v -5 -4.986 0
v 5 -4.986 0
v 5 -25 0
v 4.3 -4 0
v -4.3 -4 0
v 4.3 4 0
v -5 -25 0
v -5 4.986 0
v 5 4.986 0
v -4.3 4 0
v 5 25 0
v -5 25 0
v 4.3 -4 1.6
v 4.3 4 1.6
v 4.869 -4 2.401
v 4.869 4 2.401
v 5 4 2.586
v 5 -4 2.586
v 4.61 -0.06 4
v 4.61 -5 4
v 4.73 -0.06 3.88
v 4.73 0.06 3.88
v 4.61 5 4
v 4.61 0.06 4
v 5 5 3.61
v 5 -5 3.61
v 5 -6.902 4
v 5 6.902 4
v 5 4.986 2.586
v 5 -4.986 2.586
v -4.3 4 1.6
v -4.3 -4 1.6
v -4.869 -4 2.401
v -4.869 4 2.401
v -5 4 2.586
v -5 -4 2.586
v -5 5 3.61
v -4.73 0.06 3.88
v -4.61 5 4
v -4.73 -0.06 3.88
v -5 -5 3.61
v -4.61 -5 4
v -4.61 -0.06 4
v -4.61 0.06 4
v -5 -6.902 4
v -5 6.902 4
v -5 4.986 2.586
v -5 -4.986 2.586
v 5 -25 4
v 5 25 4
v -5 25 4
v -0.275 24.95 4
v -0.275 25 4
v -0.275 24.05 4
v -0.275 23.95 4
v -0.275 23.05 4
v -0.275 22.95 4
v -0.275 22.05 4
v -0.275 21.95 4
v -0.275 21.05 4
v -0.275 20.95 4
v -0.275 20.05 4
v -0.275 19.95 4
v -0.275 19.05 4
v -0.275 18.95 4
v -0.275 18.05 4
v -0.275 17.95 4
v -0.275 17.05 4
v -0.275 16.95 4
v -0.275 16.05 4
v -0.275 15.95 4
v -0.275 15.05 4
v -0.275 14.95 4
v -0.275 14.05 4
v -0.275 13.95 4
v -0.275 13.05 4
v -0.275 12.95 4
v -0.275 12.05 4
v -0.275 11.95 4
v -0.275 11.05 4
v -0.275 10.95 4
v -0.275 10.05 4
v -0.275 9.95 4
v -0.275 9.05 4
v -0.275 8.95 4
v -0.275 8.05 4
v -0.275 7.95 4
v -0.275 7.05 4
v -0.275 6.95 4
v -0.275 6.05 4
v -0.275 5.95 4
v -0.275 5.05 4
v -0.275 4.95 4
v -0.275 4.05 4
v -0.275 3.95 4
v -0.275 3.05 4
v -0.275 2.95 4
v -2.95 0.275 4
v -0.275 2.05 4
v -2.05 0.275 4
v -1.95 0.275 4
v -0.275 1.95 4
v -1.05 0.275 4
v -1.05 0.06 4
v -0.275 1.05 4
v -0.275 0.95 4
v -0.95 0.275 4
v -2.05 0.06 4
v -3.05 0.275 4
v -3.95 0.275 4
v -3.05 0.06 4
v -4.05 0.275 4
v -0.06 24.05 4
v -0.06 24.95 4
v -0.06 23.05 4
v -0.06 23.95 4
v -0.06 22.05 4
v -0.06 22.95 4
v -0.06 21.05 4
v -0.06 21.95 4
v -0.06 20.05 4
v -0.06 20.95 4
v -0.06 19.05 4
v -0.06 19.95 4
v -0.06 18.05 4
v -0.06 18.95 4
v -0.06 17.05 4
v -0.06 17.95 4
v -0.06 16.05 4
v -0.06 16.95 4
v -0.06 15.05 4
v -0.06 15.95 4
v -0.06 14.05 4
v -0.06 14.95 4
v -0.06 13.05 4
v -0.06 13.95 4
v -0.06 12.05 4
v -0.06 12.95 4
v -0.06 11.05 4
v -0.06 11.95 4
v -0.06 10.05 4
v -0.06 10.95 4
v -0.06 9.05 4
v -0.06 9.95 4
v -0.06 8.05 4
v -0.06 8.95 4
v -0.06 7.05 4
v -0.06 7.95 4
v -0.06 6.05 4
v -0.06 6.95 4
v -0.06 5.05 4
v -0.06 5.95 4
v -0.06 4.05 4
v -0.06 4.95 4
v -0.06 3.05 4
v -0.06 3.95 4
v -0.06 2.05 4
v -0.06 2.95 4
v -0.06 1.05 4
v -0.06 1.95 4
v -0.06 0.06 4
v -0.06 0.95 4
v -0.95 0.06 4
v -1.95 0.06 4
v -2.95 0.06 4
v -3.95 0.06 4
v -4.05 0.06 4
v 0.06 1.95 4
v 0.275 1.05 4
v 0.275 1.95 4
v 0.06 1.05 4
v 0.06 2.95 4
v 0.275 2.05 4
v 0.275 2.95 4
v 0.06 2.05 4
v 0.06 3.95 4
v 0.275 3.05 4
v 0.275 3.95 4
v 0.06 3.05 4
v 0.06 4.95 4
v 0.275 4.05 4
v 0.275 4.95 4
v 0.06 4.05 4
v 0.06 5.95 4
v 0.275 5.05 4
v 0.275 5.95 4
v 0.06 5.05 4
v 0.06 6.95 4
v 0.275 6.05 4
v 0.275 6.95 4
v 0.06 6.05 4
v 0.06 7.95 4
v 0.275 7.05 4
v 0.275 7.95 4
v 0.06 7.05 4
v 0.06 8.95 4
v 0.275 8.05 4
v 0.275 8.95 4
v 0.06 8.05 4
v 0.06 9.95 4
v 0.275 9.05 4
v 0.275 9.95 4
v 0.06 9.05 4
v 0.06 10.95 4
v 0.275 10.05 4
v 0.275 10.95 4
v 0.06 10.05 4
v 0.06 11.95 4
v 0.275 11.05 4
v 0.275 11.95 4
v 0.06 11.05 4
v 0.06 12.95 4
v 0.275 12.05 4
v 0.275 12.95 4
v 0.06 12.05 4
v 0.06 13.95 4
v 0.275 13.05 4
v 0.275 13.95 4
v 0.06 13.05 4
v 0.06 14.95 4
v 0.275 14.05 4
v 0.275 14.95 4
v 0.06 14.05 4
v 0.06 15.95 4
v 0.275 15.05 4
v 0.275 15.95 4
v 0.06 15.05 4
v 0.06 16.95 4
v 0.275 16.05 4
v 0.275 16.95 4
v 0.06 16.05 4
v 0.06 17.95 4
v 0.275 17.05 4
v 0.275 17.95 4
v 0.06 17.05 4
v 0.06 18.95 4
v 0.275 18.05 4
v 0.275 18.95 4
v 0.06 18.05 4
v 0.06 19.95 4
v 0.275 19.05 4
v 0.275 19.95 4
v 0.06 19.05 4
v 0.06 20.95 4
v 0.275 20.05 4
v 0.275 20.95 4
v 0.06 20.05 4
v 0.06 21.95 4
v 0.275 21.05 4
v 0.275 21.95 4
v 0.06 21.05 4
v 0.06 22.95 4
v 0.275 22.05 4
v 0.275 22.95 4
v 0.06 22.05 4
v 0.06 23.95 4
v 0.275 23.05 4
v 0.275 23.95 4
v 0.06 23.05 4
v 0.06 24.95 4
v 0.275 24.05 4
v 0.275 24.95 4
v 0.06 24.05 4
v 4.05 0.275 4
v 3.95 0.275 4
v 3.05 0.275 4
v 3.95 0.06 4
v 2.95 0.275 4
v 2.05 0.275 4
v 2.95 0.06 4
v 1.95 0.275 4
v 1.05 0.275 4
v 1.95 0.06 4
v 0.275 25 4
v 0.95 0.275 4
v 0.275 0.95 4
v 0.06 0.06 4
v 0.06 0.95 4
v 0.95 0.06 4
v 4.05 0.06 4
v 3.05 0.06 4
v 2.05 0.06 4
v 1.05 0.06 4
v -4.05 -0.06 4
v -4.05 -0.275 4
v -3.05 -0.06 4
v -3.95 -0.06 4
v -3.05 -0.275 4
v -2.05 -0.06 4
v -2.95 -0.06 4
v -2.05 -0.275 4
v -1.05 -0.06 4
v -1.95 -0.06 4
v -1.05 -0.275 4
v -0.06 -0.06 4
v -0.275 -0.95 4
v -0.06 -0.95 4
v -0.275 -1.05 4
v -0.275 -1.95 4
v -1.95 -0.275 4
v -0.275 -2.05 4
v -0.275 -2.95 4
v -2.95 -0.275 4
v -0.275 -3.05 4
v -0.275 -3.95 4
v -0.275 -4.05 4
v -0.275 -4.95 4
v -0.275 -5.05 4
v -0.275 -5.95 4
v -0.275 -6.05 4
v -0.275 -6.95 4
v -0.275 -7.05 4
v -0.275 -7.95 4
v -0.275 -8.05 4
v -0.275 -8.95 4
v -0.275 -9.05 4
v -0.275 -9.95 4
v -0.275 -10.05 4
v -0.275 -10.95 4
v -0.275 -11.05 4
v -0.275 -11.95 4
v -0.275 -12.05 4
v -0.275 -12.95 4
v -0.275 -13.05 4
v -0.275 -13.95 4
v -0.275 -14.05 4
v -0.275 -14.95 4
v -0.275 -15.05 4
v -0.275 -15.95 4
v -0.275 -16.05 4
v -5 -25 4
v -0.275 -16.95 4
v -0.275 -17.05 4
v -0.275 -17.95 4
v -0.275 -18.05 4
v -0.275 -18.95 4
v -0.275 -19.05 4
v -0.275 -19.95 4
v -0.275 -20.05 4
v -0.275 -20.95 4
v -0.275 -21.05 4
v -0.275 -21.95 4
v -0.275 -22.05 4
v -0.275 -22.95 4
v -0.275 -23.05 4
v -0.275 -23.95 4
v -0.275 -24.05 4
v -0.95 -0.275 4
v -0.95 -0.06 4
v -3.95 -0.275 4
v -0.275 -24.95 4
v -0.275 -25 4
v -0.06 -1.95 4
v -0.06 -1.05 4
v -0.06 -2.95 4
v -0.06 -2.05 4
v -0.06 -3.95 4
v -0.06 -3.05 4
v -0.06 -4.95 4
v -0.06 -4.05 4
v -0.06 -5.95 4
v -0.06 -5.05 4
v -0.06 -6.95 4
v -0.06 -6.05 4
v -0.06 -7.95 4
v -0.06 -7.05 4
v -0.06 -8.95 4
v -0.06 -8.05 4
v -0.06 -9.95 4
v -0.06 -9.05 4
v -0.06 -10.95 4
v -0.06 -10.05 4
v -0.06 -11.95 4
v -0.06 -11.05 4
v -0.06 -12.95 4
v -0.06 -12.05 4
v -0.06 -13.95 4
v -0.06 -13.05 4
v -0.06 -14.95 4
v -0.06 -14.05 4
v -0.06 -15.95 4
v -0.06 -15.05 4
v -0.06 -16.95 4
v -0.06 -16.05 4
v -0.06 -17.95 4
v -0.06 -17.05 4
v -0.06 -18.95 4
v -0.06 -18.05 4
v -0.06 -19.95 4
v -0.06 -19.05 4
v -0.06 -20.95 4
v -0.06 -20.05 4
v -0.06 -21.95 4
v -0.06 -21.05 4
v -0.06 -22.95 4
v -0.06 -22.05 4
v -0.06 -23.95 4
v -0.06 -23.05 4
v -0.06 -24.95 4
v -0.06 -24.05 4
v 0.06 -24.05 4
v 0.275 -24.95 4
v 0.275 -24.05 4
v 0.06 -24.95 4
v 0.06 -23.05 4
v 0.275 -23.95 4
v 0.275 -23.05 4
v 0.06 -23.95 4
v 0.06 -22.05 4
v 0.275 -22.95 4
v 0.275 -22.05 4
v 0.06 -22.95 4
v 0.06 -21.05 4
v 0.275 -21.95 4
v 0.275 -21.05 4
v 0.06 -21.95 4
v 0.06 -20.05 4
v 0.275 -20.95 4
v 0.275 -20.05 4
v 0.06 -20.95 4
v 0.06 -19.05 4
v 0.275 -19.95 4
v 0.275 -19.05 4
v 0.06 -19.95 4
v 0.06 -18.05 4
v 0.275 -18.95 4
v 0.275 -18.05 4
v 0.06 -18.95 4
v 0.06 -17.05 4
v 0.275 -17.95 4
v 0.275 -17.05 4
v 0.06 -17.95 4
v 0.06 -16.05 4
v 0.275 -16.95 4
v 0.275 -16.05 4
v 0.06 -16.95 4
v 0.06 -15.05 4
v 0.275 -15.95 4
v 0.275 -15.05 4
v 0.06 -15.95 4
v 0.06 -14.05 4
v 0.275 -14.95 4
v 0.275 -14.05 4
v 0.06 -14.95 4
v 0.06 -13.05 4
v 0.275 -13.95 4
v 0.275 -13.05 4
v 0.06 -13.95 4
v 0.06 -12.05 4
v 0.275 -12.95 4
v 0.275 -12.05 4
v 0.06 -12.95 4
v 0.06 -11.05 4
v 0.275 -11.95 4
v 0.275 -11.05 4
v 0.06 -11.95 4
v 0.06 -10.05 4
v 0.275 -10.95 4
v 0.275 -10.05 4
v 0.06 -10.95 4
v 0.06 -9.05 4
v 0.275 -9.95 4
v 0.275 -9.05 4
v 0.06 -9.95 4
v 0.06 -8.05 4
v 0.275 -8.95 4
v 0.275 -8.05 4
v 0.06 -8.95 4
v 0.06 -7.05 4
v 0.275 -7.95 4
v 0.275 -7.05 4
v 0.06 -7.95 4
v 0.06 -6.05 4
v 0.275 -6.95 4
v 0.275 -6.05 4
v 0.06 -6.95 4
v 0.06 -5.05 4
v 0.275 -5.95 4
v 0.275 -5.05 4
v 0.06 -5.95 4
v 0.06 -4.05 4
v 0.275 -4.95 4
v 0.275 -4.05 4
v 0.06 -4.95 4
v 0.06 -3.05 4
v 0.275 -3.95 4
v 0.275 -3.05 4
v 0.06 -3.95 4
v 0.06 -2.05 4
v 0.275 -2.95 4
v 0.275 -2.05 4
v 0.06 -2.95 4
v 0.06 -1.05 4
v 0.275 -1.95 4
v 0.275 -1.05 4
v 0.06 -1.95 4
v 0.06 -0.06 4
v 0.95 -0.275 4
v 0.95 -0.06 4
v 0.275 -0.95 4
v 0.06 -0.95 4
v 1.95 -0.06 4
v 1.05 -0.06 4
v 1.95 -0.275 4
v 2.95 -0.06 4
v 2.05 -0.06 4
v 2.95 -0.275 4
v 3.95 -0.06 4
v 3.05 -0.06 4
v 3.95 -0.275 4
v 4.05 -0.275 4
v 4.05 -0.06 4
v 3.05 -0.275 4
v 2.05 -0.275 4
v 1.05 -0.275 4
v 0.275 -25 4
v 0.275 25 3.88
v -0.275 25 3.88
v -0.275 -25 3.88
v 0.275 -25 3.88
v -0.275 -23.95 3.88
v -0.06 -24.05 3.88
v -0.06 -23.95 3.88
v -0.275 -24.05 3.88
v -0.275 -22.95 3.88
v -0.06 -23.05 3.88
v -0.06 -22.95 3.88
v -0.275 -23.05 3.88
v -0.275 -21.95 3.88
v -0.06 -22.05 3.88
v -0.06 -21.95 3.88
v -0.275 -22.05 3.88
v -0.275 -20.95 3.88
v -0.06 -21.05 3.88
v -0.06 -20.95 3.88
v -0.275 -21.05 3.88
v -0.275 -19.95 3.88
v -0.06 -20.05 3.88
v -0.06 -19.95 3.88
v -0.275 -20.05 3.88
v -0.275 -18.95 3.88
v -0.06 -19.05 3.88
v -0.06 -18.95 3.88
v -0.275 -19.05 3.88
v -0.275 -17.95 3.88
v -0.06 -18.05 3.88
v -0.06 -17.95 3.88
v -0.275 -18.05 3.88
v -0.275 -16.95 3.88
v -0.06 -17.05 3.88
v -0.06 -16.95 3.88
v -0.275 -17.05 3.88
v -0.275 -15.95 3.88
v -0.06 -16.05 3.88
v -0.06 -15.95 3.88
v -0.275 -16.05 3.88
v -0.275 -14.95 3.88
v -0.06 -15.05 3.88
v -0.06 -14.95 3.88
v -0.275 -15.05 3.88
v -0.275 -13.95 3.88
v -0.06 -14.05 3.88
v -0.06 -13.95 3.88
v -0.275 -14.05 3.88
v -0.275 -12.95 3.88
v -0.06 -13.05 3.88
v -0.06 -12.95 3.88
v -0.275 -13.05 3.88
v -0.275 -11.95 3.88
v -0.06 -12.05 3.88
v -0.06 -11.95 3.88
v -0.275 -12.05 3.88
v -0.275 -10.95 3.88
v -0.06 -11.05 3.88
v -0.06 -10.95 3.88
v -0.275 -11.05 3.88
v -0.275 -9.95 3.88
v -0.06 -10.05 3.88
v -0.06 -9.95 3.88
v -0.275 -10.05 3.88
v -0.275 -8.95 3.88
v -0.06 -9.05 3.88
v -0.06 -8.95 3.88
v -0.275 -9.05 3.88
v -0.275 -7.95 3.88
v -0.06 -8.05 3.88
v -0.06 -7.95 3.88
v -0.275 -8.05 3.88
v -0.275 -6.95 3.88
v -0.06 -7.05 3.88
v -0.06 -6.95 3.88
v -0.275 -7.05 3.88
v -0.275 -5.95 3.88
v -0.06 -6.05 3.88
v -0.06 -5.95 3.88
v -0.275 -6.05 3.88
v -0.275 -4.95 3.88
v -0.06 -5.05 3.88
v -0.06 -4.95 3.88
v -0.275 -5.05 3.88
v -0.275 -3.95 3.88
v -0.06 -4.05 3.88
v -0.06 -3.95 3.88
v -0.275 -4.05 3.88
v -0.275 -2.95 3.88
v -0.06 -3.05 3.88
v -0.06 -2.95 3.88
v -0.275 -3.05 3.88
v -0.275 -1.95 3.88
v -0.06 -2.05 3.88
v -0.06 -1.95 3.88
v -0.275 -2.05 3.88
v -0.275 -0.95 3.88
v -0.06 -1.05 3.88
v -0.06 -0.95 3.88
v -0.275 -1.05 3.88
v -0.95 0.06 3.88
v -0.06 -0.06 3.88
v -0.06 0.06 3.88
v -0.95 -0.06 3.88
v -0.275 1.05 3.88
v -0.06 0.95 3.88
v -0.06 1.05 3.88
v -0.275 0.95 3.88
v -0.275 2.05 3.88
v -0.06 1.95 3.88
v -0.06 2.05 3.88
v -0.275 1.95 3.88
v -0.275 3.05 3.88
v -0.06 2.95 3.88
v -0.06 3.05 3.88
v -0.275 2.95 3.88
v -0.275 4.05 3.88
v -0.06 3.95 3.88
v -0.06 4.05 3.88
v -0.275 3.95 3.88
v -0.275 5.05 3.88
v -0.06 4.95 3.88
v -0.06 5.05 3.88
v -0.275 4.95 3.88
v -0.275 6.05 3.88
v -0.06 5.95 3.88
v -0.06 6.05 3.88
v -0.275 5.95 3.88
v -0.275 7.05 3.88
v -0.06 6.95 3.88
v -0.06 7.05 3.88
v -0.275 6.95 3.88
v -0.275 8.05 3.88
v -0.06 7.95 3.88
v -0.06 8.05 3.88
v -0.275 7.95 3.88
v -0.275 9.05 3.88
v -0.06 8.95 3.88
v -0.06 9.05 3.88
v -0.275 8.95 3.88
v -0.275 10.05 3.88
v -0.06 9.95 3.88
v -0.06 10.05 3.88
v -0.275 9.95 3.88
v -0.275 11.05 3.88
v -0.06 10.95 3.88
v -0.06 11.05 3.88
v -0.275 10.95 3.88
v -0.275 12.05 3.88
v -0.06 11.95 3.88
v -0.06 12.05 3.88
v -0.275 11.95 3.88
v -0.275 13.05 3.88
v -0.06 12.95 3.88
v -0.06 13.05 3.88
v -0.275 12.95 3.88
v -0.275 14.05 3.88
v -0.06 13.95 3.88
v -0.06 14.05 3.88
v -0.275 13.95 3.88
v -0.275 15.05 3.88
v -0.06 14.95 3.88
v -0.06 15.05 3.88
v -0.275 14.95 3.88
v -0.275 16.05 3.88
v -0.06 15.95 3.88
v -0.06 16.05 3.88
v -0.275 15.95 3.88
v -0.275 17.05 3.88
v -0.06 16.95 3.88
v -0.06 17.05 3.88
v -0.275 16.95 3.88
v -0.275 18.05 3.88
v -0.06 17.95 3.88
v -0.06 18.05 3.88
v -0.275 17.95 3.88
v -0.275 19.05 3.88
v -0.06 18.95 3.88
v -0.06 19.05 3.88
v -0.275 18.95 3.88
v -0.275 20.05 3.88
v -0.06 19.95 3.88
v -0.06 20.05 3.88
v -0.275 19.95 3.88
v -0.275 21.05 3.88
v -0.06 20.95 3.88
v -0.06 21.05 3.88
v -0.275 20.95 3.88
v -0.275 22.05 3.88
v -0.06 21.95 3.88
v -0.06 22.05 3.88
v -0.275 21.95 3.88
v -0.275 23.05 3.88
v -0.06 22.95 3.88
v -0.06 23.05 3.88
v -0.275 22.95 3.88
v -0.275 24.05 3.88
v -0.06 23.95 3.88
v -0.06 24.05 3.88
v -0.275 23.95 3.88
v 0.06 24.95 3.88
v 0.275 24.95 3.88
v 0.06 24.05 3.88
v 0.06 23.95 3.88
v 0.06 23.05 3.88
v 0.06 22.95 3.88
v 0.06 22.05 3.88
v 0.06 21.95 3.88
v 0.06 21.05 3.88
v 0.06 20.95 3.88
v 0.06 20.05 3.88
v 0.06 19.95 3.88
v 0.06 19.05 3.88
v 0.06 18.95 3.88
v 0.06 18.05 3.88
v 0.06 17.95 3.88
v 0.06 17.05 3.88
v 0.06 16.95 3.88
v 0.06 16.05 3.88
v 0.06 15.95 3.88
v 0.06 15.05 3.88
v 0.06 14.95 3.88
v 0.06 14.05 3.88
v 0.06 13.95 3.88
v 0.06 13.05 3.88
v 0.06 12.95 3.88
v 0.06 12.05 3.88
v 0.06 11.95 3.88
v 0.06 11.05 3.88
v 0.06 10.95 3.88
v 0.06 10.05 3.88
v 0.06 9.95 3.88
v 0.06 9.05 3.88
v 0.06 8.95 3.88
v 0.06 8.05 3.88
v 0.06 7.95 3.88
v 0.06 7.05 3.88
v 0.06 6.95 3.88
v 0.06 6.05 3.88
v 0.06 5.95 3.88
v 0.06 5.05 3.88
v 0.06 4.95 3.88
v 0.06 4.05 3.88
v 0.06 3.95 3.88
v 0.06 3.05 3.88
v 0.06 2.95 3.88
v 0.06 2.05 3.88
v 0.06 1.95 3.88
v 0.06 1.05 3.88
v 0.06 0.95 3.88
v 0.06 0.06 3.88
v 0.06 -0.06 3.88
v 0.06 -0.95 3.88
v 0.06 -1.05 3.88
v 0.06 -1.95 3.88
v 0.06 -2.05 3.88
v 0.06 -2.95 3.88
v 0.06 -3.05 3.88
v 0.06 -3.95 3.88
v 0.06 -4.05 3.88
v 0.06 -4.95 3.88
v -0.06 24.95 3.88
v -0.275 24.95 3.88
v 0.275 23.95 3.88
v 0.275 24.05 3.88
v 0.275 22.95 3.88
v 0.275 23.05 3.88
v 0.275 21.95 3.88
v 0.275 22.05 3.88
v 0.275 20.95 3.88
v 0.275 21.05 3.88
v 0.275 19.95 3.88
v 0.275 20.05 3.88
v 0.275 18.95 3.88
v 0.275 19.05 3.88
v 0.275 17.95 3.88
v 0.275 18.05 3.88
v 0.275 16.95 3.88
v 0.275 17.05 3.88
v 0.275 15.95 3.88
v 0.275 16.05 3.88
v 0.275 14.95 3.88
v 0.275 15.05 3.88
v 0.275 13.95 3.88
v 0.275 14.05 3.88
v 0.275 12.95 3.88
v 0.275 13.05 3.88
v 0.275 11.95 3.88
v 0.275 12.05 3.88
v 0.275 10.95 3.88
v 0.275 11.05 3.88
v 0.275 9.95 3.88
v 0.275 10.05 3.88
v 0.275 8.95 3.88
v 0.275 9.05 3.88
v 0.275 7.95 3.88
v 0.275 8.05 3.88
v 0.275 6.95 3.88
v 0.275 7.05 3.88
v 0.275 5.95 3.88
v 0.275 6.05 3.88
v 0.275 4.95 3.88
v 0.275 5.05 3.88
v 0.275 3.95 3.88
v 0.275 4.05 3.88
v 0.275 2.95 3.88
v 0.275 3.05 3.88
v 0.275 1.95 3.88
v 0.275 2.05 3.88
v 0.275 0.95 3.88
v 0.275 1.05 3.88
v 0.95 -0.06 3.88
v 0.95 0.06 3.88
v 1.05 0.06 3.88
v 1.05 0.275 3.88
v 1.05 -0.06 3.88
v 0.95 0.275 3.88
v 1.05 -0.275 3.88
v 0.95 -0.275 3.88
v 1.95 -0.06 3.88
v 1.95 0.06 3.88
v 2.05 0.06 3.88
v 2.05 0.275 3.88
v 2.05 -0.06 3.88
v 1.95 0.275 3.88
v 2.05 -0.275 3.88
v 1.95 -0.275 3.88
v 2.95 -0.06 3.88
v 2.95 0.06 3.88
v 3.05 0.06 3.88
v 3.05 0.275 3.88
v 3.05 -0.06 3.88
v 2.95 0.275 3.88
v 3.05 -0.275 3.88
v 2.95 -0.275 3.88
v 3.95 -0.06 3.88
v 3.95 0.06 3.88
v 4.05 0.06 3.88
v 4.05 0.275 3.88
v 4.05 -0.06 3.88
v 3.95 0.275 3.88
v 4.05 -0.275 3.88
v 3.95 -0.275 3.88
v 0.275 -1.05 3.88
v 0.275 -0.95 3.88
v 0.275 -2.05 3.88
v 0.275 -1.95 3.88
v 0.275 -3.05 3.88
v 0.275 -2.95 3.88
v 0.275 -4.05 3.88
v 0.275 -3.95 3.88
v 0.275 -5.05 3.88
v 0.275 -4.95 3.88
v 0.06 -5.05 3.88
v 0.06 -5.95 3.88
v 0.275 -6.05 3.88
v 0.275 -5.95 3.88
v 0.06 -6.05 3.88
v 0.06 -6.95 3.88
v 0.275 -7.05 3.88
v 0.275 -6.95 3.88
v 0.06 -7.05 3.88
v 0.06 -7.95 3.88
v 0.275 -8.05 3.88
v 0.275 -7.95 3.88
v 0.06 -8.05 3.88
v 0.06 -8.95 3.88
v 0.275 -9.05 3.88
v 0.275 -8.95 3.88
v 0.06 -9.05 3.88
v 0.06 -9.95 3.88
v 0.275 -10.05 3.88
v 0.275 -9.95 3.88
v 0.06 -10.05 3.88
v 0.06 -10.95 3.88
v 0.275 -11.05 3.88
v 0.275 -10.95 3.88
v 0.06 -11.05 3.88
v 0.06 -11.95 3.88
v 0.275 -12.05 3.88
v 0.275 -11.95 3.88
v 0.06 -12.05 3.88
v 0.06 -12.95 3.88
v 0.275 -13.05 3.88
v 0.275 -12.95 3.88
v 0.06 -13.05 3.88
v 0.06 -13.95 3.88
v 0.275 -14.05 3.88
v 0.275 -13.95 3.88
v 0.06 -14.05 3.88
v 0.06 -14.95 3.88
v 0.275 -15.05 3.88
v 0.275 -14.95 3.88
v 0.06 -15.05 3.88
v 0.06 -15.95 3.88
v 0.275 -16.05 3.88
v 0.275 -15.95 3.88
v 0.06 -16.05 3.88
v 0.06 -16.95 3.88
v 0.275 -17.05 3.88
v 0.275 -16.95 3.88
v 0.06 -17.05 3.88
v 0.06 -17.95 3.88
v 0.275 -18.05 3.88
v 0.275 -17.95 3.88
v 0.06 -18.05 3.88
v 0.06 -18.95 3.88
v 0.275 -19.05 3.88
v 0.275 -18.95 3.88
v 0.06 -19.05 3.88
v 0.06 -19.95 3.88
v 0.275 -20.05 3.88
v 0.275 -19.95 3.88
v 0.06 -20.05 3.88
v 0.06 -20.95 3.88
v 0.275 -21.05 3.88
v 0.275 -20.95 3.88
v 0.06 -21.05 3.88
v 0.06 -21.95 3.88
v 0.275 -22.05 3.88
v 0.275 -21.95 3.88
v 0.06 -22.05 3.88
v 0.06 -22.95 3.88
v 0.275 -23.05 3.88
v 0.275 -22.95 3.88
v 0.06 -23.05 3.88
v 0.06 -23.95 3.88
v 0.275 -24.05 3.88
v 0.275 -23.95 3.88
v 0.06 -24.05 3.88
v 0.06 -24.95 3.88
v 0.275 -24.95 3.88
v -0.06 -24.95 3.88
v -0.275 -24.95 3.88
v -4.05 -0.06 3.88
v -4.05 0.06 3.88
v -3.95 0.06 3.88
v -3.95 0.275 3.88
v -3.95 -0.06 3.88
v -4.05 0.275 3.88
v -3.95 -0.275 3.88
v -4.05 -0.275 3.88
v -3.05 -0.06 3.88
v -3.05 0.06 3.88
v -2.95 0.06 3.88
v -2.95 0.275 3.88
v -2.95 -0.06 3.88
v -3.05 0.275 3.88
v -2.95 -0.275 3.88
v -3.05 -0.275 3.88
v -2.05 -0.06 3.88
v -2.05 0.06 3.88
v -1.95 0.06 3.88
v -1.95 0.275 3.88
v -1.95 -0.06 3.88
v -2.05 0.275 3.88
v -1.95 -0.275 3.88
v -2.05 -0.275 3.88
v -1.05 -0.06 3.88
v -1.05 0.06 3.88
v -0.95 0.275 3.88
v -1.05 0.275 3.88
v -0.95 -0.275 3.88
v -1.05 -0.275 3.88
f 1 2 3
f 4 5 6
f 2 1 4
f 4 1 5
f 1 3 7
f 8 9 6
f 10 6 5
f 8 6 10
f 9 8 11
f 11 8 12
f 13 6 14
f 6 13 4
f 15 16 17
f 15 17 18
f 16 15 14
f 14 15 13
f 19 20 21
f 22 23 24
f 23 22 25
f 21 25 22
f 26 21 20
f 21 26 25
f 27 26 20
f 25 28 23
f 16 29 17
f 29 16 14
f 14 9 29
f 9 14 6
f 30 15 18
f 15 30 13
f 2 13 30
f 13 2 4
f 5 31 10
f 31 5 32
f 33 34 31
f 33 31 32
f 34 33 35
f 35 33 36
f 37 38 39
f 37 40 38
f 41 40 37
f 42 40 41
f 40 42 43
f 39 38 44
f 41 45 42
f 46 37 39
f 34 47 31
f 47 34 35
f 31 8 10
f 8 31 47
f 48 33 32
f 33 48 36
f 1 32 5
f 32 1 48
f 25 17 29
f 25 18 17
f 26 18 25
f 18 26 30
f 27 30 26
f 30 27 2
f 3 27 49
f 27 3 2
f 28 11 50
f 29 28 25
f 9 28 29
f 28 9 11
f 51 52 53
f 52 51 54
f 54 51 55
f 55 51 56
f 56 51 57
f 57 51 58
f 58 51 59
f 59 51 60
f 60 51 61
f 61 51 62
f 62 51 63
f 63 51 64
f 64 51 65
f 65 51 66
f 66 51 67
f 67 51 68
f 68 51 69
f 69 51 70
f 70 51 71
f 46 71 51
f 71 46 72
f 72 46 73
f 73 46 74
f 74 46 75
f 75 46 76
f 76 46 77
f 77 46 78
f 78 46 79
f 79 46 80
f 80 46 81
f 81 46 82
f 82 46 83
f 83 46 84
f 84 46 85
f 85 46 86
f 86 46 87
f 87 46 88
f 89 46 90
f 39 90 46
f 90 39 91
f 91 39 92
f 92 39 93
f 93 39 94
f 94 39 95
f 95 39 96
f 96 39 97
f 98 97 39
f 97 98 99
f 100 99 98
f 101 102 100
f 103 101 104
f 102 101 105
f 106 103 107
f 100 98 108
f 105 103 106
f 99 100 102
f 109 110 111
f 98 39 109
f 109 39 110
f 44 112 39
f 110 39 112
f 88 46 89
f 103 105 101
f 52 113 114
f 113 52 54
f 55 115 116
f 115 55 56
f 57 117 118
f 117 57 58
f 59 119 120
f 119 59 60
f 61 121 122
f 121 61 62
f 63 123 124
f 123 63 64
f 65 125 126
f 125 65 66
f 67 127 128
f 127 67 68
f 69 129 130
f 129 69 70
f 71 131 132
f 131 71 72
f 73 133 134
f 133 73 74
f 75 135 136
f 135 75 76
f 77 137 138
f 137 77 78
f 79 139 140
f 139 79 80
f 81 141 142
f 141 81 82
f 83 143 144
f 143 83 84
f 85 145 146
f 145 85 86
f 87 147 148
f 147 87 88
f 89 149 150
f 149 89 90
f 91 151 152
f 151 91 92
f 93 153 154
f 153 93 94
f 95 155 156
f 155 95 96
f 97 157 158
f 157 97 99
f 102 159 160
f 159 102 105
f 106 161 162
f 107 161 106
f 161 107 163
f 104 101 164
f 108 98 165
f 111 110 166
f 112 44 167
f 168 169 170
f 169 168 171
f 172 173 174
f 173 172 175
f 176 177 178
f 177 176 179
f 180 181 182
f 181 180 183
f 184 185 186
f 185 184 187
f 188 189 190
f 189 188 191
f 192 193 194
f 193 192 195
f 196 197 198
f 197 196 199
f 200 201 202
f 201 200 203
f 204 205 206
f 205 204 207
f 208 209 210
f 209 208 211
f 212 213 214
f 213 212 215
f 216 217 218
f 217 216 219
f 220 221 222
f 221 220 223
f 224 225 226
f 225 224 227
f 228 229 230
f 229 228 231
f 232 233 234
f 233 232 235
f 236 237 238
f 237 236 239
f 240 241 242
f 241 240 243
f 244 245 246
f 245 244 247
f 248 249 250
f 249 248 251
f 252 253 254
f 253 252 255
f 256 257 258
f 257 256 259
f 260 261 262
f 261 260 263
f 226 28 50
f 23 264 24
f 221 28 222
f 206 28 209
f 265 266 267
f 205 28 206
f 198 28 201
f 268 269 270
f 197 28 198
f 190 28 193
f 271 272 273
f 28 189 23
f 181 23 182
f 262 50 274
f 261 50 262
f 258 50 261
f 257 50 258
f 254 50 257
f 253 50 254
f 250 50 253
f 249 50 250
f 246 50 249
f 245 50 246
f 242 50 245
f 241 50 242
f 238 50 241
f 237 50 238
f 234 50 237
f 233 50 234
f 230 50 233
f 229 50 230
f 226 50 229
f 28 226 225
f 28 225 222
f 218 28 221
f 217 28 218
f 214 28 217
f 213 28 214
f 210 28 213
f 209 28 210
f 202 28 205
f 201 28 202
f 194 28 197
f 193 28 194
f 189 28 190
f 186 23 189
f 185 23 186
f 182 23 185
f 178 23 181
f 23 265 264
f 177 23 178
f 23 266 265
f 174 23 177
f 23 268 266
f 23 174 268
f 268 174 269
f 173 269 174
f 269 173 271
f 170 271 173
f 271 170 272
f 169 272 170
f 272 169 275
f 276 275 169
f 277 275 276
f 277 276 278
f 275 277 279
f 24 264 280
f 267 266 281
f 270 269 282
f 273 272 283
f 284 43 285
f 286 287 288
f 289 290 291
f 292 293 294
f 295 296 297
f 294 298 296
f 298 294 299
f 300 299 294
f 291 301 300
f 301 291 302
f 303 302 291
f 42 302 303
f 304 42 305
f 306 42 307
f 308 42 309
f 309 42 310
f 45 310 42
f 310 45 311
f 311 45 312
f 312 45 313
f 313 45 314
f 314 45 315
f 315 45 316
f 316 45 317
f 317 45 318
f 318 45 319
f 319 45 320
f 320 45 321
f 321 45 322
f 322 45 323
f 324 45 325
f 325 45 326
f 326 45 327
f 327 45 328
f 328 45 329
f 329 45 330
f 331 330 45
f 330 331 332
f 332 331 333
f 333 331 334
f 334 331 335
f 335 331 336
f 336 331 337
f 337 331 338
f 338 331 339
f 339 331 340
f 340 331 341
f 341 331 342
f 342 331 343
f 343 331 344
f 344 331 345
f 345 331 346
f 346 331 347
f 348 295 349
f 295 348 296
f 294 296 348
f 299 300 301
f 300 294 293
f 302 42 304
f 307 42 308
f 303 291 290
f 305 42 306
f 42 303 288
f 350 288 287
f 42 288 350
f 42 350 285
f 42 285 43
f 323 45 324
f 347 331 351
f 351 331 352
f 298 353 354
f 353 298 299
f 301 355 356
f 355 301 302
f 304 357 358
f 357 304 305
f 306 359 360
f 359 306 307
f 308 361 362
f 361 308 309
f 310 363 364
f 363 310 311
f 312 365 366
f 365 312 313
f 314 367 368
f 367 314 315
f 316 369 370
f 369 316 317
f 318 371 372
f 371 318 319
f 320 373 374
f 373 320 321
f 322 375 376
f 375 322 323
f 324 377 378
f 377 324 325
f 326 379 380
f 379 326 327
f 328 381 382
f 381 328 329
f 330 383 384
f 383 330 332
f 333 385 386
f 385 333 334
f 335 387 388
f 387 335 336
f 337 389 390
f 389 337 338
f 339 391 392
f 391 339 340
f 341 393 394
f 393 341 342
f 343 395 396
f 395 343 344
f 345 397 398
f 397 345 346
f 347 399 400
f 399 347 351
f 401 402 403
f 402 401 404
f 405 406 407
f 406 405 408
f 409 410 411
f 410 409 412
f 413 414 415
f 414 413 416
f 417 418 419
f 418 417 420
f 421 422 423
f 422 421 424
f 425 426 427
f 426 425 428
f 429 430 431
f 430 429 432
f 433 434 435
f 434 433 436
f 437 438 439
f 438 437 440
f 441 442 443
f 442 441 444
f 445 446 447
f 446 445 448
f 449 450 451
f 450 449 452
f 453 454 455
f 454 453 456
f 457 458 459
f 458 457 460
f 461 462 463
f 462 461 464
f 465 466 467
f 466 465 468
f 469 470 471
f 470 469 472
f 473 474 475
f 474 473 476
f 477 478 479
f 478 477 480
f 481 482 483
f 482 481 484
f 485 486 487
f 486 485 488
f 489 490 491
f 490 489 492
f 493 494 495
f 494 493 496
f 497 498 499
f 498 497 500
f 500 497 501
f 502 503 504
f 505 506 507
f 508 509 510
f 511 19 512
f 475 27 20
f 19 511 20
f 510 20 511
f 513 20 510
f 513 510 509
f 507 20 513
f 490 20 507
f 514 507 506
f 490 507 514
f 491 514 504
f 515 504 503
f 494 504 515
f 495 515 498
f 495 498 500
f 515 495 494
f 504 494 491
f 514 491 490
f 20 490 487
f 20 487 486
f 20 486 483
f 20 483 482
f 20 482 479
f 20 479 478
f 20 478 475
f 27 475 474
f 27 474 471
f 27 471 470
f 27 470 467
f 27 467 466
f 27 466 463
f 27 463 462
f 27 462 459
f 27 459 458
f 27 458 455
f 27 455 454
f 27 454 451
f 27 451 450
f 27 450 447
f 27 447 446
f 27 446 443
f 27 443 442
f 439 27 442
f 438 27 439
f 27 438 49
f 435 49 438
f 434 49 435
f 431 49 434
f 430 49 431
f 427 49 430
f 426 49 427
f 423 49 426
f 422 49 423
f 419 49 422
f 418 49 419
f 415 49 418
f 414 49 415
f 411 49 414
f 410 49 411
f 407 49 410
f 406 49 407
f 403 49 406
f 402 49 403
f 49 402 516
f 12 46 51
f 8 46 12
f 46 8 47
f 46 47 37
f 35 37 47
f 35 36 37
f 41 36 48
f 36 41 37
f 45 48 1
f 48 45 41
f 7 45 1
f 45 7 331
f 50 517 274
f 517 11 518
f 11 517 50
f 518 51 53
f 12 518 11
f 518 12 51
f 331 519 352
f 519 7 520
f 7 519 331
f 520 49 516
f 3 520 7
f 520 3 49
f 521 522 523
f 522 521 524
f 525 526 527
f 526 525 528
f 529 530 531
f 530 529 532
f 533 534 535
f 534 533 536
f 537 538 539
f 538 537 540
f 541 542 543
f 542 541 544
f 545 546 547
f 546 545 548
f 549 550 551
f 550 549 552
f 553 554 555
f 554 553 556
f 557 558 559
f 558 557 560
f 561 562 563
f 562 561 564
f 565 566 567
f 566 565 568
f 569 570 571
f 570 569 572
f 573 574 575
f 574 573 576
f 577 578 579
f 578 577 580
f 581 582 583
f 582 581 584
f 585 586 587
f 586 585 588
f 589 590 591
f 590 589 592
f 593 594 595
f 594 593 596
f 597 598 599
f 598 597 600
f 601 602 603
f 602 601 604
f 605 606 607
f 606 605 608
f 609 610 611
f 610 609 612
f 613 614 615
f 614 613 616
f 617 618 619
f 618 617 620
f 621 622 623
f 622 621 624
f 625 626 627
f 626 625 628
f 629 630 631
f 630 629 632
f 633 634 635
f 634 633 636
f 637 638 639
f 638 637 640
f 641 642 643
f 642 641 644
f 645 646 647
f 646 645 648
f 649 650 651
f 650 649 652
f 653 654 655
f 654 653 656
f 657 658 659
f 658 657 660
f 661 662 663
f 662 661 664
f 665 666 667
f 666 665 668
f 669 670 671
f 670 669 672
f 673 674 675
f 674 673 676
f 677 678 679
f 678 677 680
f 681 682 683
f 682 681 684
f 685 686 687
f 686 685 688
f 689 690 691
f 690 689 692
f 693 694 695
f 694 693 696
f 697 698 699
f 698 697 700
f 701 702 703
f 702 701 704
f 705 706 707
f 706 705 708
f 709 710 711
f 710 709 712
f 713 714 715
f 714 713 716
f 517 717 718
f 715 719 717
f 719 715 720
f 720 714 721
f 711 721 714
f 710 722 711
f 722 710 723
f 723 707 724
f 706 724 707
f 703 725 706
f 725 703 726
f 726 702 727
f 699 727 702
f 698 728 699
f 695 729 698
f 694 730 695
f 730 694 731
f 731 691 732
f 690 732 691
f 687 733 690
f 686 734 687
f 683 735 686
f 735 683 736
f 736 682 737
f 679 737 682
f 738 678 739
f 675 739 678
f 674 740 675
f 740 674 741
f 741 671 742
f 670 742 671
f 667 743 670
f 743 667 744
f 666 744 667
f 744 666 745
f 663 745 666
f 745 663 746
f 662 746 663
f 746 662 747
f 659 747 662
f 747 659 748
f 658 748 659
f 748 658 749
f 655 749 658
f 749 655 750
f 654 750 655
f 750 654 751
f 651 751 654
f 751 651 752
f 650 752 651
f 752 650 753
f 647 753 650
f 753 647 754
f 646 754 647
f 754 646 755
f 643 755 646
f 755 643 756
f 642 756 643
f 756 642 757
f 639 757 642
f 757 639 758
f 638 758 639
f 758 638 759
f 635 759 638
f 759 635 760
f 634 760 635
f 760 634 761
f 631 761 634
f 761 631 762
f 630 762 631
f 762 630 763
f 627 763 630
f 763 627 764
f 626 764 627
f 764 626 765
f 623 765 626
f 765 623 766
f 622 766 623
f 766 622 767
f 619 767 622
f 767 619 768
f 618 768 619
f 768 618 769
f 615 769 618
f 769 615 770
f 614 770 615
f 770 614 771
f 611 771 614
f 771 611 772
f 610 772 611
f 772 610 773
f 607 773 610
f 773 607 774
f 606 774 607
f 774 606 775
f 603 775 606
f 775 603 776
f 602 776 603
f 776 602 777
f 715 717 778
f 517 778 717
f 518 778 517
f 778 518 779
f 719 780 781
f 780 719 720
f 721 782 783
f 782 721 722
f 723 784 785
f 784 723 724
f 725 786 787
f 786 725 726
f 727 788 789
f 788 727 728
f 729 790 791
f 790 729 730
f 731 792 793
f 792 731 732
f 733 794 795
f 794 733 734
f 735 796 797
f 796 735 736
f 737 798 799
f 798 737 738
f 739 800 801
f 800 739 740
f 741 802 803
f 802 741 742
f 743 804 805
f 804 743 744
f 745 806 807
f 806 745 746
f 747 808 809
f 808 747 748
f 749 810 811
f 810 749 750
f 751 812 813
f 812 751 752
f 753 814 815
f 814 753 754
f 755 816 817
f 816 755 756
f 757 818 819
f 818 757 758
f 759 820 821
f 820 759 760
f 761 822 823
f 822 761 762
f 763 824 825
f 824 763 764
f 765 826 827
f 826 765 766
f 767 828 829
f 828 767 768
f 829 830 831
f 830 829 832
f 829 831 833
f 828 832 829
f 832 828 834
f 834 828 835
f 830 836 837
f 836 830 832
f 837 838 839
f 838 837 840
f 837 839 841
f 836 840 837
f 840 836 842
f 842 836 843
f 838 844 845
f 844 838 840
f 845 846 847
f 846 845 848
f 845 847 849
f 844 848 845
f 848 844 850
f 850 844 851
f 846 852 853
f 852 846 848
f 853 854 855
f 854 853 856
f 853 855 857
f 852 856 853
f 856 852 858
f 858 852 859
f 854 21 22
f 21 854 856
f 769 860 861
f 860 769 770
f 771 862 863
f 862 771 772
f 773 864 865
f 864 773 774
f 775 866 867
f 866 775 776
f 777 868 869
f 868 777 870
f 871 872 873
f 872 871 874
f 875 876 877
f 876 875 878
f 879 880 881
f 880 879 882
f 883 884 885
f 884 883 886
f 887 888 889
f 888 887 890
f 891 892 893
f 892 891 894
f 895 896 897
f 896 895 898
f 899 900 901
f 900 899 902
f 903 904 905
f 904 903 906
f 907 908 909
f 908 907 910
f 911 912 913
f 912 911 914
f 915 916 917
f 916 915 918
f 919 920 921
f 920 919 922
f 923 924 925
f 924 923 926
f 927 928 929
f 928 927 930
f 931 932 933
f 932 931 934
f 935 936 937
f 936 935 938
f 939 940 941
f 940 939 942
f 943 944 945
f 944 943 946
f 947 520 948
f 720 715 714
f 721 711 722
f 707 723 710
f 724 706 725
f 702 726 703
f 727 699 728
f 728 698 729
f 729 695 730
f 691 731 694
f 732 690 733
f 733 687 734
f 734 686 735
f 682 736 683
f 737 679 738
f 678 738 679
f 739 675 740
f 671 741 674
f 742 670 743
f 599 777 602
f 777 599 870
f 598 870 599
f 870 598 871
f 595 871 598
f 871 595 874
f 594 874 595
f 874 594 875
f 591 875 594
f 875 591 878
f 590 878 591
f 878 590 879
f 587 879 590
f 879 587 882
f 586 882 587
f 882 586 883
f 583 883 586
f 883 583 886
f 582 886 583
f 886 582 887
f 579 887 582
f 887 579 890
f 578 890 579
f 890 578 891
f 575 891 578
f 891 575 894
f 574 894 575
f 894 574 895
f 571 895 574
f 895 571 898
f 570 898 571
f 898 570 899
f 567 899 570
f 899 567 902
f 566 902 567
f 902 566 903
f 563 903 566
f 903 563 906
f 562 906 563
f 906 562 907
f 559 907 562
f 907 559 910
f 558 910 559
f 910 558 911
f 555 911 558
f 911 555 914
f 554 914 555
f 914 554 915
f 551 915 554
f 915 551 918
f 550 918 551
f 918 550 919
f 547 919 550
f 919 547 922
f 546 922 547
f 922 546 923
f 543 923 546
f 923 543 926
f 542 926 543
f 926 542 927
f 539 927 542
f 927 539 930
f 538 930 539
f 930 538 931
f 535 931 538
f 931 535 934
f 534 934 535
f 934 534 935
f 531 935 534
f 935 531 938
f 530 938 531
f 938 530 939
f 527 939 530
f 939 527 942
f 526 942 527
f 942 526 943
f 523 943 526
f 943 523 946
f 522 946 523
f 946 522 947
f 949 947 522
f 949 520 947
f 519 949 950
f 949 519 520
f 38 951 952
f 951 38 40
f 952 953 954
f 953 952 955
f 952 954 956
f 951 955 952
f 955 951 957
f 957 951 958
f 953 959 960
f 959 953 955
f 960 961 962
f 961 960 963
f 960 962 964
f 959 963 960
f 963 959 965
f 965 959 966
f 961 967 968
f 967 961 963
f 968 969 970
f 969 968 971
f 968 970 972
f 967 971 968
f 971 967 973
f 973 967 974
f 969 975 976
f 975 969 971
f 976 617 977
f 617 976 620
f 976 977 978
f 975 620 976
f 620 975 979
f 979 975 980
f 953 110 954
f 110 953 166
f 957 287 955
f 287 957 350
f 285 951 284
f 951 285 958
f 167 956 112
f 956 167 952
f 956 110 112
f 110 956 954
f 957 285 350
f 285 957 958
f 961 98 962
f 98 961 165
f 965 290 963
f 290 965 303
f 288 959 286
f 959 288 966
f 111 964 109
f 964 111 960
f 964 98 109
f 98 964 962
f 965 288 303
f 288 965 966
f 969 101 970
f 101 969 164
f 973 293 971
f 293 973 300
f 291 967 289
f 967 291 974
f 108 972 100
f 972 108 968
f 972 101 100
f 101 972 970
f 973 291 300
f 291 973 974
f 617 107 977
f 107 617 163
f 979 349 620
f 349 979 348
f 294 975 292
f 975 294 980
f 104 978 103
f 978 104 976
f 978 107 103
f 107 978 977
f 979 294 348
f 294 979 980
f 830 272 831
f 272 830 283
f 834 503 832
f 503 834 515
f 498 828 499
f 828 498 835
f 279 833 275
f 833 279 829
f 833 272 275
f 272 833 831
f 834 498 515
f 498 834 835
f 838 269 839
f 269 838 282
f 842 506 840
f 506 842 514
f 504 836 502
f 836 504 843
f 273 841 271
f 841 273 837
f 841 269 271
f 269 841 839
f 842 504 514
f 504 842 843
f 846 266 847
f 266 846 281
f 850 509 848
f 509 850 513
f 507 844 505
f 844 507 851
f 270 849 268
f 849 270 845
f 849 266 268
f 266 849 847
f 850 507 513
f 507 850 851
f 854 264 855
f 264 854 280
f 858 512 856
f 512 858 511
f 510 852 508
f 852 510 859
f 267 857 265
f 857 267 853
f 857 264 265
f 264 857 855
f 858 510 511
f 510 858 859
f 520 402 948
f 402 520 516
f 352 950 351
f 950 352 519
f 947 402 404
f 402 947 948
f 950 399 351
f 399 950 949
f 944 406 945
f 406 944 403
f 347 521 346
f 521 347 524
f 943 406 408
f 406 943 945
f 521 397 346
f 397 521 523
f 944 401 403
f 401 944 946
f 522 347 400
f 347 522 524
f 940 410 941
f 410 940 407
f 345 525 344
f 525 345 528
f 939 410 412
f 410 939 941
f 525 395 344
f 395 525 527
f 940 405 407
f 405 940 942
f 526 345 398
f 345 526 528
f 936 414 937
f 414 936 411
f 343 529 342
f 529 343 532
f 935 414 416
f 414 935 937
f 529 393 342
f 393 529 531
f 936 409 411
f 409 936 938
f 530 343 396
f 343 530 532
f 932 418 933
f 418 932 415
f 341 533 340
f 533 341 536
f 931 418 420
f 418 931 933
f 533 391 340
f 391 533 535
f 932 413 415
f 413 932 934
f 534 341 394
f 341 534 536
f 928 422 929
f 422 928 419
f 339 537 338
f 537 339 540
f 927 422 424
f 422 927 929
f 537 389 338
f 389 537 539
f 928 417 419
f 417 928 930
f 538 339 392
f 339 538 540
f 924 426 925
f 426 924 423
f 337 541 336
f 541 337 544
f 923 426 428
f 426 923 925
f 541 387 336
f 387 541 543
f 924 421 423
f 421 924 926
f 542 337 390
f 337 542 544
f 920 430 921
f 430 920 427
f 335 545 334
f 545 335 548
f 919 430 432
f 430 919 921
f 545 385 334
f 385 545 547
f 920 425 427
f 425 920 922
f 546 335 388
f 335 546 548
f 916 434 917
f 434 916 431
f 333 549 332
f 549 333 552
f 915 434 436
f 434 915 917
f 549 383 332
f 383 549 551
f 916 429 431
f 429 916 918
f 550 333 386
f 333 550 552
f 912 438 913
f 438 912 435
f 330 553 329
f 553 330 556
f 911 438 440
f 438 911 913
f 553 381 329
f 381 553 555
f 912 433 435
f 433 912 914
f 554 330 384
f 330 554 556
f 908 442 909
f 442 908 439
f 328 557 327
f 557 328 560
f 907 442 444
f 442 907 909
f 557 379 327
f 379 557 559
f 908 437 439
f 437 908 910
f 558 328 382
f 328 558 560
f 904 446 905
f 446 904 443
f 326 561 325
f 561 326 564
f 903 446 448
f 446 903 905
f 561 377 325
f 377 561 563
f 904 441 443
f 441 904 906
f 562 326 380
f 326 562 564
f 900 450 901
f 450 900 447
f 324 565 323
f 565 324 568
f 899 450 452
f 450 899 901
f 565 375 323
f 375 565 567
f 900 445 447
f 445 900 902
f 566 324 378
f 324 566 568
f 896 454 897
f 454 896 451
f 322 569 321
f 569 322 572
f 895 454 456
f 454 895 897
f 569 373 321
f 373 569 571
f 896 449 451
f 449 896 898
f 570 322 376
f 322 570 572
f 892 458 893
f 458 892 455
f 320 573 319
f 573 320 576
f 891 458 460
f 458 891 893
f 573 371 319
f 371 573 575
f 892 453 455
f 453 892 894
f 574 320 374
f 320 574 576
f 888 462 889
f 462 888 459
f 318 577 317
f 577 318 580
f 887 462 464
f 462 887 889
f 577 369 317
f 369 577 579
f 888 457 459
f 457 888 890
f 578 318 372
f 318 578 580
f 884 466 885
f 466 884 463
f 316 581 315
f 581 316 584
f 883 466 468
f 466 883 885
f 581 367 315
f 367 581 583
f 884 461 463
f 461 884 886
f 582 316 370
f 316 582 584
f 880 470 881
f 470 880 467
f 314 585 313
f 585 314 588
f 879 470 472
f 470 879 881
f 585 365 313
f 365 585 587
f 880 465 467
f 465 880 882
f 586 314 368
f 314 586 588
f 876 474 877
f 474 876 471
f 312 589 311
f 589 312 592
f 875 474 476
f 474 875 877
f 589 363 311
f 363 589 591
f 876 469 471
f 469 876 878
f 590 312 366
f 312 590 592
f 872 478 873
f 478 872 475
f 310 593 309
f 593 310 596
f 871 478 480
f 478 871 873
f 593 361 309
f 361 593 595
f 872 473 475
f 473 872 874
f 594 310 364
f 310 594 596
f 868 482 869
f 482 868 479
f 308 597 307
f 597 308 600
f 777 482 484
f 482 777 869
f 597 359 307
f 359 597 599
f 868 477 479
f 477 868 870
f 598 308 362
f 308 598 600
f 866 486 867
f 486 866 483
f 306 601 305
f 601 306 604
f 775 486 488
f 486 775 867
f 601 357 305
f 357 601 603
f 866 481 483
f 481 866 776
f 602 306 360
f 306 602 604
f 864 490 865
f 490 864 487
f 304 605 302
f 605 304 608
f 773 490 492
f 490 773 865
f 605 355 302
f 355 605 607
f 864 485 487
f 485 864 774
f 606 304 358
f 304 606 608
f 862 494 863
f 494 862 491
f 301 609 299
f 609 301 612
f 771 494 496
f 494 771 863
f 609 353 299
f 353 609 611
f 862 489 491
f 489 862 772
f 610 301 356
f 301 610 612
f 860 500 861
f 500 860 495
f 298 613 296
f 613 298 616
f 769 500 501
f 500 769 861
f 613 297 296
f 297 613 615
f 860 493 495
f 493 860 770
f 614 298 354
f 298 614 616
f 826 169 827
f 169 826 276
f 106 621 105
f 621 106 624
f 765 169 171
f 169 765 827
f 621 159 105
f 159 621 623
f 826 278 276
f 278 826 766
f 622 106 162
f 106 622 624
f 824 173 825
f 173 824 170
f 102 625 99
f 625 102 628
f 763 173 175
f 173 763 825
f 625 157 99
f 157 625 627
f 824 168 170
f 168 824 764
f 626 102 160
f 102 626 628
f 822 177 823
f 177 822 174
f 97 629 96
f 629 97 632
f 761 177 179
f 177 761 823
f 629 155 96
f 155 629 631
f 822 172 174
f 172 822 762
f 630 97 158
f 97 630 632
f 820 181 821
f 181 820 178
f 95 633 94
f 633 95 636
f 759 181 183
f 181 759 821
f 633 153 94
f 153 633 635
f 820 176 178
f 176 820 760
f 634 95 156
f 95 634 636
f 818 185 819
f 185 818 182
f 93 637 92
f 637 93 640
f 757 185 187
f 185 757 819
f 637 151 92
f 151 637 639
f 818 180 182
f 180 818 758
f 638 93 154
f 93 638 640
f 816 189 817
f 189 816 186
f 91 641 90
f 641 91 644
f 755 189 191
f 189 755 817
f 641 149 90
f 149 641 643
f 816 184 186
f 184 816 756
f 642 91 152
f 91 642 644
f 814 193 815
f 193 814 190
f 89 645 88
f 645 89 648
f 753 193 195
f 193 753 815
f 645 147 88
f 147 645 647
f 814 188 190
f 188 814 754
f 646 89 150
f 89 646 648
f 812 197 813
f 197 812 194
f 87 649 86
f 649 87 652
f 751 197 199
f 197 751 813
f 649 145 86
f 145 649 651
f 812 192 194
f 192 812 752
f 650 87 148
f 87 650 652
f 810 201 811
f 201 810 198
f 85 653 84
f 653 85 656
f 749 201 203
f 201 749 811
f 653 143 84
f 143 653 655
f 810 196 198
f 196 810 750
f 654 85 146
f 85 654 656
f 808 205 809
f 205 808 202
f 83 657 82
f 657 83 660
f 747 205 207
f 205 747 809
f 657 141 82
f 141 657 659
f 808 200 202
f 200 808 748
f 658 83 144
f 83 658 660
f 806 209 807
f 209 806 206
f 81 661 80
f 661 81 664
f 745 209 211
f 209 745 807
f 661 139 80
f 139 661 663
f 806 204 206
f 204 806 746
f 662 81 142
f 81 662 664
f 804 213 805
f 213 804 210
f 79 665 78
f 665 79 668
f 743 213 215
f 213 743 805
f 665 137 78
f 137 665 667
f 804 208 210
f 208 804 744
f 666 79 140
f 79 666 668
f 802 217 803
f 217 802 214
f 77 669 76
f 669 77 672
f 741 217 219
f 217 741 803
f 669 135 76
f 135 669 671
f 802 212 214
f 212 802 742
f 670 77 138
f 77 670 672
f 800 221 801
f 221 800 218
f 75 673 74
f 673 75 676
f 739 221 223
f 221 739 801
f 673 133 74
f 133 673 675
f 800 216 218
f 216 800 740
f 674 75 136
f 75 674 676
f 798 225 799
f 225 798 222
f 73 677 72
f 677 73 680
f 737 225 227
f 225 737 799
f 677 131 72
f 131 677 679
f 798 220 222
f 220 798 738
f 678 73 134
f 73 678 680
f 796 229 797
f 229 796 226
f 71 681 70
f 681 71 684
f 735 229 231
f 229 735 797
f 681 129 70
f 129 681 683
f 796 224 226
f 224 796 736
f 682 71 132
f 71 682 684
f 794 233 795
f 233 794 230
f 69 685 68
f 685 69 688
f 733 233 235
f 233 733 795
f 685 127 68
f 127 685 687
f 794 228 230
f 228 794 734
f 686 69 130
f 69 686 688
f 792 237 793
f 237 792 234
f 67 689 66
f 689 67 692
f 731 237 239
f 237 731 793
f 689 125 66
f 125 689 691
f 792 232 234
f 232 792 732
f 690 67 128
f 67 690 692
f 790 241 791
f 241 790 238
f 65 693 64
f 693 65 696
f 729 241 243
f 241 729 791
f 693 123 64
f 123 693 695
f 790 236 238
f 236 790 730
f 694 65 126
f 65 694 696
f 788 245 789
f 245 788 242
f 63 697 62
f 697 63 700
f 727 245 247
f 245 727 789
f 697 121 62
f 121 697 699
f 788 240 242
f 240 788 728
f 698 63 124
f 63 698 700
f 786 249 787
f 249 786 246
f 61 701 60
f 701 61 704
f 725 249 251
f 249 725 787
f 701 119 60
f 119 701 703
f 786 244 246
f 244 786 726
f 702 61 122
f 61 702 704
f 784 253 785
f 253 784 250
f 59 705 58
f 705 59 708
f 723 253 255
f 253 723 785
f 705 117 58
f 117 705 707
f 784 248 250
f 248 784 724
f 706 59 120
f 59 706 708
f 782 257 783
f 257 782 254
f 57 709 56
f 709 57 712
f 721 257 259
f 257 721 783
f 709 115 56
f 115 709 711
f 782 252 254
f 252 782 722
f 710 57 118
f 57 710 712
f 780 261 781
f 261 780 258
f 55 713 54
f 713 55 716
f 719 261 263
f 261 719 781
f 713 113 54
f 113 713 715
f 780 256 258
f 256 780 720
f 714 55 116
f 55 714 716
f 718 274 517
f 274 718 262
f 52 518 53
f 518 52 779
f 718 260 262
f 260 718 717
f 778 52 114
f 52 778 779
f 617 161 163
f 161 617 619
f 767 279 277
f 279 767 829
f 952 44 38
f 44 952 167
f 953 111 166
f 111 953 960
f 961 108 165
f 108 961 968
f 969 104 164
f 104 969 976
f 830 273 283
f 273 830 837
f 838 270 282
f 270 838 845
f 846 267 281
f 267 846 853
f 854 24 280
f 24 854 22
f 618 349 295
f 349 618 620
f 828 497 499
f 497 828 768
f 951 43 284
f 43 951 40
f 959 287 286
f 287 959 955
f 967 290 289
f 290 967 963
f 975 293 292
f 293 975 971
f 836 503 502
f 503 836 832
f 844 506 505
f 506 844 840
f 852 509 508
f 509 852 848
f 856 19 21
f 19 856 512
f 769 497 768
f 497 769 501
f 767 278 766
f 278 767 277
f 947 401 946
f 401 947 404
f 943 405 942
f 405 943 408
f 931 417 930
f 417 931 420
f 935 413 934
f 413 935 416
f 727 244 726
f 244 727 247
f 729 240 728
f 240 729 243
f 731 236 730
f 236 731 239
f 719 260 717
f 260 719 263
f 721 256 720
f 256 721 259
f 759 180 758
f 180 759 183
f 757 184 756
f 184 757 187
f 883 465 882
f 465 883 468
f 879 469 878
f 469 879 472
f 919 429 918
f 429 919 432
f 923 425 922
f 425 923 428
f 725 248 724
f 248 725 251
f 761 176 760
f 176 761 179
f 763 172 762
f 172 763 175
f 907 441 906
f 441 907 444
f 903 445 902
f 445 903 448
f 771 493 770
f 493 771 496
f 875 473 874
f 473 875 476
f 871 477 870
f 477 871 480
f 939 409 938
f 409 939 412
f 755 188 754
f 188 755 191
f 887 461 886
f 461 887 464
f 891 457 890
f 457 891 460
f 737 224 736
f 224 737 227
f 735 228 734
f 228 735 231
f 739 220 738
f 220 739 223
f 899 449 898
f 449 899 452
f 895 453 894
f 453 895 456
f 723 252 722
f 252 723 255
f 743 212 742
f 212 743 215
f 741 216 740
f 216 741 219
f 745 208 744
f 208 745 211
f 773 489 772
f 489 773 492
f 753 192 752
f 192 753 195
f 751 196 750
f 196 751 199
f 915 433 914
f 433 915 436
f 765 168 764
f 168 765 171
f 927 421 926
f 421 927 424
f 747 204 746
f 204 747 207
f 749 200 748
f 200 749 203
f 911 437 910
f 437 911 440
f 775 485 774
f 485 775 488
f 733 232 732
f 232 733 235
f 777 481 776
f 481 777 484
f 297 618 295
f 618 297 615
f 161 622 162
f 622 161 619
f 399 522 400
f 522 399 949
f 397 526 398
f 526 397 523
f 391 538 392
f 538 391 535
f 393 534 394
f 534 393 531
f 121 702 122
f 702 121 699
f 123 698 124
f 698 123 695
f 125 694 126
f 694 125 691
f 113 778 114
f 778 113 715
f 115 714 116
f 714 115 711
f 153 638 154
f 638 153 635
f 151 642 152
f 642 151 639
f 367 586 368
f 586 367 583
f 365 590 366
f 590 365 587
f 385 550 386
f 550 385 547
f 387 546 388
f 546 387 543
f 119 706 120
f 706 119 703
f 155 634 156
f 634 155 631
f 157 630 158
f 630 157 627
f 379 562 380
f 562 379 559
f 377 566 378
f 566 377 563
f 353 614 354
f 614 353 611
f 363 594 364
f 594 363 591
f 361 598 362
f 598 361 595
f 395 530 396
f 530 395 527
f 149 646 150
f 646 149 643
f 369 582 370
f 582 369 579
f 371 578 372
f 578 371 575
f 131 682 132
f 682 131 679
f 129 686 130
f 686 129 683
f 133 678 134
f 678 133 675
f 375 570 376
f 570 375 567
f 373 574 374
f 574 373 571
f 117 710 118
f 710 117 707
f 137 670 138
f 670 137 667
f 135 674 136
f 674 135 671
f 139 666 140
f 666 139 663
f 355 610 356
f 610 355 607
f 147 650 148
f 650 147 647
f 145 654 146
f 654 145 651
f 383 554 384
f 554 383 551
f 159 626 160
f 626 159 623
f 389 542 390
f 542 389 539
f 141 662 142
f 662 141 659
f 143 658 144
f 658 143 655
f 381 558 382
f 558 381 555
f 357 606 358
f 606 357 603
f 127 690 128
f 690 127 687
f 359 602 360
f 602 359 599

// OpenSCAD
// file: ../lib/BOSL2/std.scad
// Minimal BOSL2 compatibility shim for bundled gallery models.
// It implements only the helpers used by the imported OpenSCAD projects.

CENTER = [0, 0, 0];
BOTTOM = [0, 0, -1];
TOP = [0, 0, 1];
LEFT = [-1, 0, 0];
RIGHT = [1, 0, 0];
FRONT = [0, -1, 0];
BACK = [0, 1, 0];

module up(z=0) {
    translate([0, 0, z]) children();
}

module down(z=0) {
    translate([0, 0, -z]) children();
}

module attach(anchor=CENTER) {
    children();
}

module cuboid(size=[1, 1, 1], anchor=CENTER) {
    center = anchor == CENTER;
    translate(center ? [0, 0, 0] : [0, 0, size[2] / 2])
        cube(size, center=true);
    children();
}

module xcyl(h=1, r=1, anchor=CENTER) {
    center = anchor == CENTER;
    translate(center ? [0, 0, 0] : [h / 2, 0, 0])
        rotate([0, 90, 0])
            cylinder(h=h, r=r, center=true);
}
// file: ../examples/receiver-rail/BOSL2/std.scad
// Minimal BOSL2 compatibility shim for bundled gallery models.
// It implements only the helpers used by the imported OpenSCAD projects.

CENTER = [0, 0, 0];
BOTTOM = [0, 0, -1];
TOP = [0, 0, 1];
LEFT = [-1, 0, 0];
RIGHT = [1, 0, 0];
FRONT = [0, -1, 0];
BACK = [0, 1, 0];

module up(z=0) {
    translate([0, 0, z]) children();
}

module down(z=0) {
    translate([0, 0, -z]) children();
}

module attach(anchor=CENTER) {
    children();
}

module cuboid(size=[1, 1, 1], anchor=CENTER) {
    center = anchor == CENTER;
    translate(center ? [0, 0, 0] : [0, 0, size[2] / 2])
        cube(size, center=true);
    children();
}

module xcyl(h=1, r=1, anchor=CENTER) {
    center = anchor == CENTER;
    translate(center ? [0, 0, 0] : [h / 2, 0, 0])
        rotate([0, 90, 0])
            cylinder(h=h, r=r, center=true);
}
// file: ../examples/receiver-rail/receiver_rail_example.scad
// SPDX-License-Identifier: CC-BY-NC-SA-4.0
//
// Integration example: embed the reduced receiver into a 50 x 10 x 4 rail.

include <BOSL2/std.scad>

$fn = 120;

use <../../lib/node_interface.scad>

module receiver_rail_example(mm_pattern = true) {
    node_receiver_rail_example(mm_pattern);
}

receiver_rail_example();
// file: BOSL2/std.scad
// Minimal BOSL2 compatibility shim for bundled gallery models.
// It implements only the helpers used by the imported OpenSCAD projects.

CENTER = [0, 0, 0];
BOTTOM = [0, 0, -1];
TOP = [0, 0, 1];
LEFT = [-1, 0, 0];
RIGHT = [1, 0, 0];
FRONT = [0, -1, 0];
BACK = [0, 1, 0];

module up(z=0) {
    translate([0, 0, z]) children();
}

module down(z=0) {
    translate([0, 0, -z]) children();
}

module attach(anchor=CENTER) {
    children();
}

module cuboid(size=[1, 1, 1], anchor=CENTER) {
    center = anchor == CENTER;
    translate(center ? [0, 0, 0] : [0, 0, size[2] / 2])
        cube(size, center=true);
    children();
}

module xcyl(h=1, r=1, anchor=CENTER) {
    center = anchor == CENTER;
    translate(center ? [0, 0, 0] : [h / 2, 0, 0])
        rotate([0, 90, 0])
            cylinder(h=h, r=r, center=true);
}
// main file
include <BOSL2/std.scad>

$fn = 120;
use <../examples/receiver-rail/receiver_rail_example.scad>

receiver_rail_example(true);
